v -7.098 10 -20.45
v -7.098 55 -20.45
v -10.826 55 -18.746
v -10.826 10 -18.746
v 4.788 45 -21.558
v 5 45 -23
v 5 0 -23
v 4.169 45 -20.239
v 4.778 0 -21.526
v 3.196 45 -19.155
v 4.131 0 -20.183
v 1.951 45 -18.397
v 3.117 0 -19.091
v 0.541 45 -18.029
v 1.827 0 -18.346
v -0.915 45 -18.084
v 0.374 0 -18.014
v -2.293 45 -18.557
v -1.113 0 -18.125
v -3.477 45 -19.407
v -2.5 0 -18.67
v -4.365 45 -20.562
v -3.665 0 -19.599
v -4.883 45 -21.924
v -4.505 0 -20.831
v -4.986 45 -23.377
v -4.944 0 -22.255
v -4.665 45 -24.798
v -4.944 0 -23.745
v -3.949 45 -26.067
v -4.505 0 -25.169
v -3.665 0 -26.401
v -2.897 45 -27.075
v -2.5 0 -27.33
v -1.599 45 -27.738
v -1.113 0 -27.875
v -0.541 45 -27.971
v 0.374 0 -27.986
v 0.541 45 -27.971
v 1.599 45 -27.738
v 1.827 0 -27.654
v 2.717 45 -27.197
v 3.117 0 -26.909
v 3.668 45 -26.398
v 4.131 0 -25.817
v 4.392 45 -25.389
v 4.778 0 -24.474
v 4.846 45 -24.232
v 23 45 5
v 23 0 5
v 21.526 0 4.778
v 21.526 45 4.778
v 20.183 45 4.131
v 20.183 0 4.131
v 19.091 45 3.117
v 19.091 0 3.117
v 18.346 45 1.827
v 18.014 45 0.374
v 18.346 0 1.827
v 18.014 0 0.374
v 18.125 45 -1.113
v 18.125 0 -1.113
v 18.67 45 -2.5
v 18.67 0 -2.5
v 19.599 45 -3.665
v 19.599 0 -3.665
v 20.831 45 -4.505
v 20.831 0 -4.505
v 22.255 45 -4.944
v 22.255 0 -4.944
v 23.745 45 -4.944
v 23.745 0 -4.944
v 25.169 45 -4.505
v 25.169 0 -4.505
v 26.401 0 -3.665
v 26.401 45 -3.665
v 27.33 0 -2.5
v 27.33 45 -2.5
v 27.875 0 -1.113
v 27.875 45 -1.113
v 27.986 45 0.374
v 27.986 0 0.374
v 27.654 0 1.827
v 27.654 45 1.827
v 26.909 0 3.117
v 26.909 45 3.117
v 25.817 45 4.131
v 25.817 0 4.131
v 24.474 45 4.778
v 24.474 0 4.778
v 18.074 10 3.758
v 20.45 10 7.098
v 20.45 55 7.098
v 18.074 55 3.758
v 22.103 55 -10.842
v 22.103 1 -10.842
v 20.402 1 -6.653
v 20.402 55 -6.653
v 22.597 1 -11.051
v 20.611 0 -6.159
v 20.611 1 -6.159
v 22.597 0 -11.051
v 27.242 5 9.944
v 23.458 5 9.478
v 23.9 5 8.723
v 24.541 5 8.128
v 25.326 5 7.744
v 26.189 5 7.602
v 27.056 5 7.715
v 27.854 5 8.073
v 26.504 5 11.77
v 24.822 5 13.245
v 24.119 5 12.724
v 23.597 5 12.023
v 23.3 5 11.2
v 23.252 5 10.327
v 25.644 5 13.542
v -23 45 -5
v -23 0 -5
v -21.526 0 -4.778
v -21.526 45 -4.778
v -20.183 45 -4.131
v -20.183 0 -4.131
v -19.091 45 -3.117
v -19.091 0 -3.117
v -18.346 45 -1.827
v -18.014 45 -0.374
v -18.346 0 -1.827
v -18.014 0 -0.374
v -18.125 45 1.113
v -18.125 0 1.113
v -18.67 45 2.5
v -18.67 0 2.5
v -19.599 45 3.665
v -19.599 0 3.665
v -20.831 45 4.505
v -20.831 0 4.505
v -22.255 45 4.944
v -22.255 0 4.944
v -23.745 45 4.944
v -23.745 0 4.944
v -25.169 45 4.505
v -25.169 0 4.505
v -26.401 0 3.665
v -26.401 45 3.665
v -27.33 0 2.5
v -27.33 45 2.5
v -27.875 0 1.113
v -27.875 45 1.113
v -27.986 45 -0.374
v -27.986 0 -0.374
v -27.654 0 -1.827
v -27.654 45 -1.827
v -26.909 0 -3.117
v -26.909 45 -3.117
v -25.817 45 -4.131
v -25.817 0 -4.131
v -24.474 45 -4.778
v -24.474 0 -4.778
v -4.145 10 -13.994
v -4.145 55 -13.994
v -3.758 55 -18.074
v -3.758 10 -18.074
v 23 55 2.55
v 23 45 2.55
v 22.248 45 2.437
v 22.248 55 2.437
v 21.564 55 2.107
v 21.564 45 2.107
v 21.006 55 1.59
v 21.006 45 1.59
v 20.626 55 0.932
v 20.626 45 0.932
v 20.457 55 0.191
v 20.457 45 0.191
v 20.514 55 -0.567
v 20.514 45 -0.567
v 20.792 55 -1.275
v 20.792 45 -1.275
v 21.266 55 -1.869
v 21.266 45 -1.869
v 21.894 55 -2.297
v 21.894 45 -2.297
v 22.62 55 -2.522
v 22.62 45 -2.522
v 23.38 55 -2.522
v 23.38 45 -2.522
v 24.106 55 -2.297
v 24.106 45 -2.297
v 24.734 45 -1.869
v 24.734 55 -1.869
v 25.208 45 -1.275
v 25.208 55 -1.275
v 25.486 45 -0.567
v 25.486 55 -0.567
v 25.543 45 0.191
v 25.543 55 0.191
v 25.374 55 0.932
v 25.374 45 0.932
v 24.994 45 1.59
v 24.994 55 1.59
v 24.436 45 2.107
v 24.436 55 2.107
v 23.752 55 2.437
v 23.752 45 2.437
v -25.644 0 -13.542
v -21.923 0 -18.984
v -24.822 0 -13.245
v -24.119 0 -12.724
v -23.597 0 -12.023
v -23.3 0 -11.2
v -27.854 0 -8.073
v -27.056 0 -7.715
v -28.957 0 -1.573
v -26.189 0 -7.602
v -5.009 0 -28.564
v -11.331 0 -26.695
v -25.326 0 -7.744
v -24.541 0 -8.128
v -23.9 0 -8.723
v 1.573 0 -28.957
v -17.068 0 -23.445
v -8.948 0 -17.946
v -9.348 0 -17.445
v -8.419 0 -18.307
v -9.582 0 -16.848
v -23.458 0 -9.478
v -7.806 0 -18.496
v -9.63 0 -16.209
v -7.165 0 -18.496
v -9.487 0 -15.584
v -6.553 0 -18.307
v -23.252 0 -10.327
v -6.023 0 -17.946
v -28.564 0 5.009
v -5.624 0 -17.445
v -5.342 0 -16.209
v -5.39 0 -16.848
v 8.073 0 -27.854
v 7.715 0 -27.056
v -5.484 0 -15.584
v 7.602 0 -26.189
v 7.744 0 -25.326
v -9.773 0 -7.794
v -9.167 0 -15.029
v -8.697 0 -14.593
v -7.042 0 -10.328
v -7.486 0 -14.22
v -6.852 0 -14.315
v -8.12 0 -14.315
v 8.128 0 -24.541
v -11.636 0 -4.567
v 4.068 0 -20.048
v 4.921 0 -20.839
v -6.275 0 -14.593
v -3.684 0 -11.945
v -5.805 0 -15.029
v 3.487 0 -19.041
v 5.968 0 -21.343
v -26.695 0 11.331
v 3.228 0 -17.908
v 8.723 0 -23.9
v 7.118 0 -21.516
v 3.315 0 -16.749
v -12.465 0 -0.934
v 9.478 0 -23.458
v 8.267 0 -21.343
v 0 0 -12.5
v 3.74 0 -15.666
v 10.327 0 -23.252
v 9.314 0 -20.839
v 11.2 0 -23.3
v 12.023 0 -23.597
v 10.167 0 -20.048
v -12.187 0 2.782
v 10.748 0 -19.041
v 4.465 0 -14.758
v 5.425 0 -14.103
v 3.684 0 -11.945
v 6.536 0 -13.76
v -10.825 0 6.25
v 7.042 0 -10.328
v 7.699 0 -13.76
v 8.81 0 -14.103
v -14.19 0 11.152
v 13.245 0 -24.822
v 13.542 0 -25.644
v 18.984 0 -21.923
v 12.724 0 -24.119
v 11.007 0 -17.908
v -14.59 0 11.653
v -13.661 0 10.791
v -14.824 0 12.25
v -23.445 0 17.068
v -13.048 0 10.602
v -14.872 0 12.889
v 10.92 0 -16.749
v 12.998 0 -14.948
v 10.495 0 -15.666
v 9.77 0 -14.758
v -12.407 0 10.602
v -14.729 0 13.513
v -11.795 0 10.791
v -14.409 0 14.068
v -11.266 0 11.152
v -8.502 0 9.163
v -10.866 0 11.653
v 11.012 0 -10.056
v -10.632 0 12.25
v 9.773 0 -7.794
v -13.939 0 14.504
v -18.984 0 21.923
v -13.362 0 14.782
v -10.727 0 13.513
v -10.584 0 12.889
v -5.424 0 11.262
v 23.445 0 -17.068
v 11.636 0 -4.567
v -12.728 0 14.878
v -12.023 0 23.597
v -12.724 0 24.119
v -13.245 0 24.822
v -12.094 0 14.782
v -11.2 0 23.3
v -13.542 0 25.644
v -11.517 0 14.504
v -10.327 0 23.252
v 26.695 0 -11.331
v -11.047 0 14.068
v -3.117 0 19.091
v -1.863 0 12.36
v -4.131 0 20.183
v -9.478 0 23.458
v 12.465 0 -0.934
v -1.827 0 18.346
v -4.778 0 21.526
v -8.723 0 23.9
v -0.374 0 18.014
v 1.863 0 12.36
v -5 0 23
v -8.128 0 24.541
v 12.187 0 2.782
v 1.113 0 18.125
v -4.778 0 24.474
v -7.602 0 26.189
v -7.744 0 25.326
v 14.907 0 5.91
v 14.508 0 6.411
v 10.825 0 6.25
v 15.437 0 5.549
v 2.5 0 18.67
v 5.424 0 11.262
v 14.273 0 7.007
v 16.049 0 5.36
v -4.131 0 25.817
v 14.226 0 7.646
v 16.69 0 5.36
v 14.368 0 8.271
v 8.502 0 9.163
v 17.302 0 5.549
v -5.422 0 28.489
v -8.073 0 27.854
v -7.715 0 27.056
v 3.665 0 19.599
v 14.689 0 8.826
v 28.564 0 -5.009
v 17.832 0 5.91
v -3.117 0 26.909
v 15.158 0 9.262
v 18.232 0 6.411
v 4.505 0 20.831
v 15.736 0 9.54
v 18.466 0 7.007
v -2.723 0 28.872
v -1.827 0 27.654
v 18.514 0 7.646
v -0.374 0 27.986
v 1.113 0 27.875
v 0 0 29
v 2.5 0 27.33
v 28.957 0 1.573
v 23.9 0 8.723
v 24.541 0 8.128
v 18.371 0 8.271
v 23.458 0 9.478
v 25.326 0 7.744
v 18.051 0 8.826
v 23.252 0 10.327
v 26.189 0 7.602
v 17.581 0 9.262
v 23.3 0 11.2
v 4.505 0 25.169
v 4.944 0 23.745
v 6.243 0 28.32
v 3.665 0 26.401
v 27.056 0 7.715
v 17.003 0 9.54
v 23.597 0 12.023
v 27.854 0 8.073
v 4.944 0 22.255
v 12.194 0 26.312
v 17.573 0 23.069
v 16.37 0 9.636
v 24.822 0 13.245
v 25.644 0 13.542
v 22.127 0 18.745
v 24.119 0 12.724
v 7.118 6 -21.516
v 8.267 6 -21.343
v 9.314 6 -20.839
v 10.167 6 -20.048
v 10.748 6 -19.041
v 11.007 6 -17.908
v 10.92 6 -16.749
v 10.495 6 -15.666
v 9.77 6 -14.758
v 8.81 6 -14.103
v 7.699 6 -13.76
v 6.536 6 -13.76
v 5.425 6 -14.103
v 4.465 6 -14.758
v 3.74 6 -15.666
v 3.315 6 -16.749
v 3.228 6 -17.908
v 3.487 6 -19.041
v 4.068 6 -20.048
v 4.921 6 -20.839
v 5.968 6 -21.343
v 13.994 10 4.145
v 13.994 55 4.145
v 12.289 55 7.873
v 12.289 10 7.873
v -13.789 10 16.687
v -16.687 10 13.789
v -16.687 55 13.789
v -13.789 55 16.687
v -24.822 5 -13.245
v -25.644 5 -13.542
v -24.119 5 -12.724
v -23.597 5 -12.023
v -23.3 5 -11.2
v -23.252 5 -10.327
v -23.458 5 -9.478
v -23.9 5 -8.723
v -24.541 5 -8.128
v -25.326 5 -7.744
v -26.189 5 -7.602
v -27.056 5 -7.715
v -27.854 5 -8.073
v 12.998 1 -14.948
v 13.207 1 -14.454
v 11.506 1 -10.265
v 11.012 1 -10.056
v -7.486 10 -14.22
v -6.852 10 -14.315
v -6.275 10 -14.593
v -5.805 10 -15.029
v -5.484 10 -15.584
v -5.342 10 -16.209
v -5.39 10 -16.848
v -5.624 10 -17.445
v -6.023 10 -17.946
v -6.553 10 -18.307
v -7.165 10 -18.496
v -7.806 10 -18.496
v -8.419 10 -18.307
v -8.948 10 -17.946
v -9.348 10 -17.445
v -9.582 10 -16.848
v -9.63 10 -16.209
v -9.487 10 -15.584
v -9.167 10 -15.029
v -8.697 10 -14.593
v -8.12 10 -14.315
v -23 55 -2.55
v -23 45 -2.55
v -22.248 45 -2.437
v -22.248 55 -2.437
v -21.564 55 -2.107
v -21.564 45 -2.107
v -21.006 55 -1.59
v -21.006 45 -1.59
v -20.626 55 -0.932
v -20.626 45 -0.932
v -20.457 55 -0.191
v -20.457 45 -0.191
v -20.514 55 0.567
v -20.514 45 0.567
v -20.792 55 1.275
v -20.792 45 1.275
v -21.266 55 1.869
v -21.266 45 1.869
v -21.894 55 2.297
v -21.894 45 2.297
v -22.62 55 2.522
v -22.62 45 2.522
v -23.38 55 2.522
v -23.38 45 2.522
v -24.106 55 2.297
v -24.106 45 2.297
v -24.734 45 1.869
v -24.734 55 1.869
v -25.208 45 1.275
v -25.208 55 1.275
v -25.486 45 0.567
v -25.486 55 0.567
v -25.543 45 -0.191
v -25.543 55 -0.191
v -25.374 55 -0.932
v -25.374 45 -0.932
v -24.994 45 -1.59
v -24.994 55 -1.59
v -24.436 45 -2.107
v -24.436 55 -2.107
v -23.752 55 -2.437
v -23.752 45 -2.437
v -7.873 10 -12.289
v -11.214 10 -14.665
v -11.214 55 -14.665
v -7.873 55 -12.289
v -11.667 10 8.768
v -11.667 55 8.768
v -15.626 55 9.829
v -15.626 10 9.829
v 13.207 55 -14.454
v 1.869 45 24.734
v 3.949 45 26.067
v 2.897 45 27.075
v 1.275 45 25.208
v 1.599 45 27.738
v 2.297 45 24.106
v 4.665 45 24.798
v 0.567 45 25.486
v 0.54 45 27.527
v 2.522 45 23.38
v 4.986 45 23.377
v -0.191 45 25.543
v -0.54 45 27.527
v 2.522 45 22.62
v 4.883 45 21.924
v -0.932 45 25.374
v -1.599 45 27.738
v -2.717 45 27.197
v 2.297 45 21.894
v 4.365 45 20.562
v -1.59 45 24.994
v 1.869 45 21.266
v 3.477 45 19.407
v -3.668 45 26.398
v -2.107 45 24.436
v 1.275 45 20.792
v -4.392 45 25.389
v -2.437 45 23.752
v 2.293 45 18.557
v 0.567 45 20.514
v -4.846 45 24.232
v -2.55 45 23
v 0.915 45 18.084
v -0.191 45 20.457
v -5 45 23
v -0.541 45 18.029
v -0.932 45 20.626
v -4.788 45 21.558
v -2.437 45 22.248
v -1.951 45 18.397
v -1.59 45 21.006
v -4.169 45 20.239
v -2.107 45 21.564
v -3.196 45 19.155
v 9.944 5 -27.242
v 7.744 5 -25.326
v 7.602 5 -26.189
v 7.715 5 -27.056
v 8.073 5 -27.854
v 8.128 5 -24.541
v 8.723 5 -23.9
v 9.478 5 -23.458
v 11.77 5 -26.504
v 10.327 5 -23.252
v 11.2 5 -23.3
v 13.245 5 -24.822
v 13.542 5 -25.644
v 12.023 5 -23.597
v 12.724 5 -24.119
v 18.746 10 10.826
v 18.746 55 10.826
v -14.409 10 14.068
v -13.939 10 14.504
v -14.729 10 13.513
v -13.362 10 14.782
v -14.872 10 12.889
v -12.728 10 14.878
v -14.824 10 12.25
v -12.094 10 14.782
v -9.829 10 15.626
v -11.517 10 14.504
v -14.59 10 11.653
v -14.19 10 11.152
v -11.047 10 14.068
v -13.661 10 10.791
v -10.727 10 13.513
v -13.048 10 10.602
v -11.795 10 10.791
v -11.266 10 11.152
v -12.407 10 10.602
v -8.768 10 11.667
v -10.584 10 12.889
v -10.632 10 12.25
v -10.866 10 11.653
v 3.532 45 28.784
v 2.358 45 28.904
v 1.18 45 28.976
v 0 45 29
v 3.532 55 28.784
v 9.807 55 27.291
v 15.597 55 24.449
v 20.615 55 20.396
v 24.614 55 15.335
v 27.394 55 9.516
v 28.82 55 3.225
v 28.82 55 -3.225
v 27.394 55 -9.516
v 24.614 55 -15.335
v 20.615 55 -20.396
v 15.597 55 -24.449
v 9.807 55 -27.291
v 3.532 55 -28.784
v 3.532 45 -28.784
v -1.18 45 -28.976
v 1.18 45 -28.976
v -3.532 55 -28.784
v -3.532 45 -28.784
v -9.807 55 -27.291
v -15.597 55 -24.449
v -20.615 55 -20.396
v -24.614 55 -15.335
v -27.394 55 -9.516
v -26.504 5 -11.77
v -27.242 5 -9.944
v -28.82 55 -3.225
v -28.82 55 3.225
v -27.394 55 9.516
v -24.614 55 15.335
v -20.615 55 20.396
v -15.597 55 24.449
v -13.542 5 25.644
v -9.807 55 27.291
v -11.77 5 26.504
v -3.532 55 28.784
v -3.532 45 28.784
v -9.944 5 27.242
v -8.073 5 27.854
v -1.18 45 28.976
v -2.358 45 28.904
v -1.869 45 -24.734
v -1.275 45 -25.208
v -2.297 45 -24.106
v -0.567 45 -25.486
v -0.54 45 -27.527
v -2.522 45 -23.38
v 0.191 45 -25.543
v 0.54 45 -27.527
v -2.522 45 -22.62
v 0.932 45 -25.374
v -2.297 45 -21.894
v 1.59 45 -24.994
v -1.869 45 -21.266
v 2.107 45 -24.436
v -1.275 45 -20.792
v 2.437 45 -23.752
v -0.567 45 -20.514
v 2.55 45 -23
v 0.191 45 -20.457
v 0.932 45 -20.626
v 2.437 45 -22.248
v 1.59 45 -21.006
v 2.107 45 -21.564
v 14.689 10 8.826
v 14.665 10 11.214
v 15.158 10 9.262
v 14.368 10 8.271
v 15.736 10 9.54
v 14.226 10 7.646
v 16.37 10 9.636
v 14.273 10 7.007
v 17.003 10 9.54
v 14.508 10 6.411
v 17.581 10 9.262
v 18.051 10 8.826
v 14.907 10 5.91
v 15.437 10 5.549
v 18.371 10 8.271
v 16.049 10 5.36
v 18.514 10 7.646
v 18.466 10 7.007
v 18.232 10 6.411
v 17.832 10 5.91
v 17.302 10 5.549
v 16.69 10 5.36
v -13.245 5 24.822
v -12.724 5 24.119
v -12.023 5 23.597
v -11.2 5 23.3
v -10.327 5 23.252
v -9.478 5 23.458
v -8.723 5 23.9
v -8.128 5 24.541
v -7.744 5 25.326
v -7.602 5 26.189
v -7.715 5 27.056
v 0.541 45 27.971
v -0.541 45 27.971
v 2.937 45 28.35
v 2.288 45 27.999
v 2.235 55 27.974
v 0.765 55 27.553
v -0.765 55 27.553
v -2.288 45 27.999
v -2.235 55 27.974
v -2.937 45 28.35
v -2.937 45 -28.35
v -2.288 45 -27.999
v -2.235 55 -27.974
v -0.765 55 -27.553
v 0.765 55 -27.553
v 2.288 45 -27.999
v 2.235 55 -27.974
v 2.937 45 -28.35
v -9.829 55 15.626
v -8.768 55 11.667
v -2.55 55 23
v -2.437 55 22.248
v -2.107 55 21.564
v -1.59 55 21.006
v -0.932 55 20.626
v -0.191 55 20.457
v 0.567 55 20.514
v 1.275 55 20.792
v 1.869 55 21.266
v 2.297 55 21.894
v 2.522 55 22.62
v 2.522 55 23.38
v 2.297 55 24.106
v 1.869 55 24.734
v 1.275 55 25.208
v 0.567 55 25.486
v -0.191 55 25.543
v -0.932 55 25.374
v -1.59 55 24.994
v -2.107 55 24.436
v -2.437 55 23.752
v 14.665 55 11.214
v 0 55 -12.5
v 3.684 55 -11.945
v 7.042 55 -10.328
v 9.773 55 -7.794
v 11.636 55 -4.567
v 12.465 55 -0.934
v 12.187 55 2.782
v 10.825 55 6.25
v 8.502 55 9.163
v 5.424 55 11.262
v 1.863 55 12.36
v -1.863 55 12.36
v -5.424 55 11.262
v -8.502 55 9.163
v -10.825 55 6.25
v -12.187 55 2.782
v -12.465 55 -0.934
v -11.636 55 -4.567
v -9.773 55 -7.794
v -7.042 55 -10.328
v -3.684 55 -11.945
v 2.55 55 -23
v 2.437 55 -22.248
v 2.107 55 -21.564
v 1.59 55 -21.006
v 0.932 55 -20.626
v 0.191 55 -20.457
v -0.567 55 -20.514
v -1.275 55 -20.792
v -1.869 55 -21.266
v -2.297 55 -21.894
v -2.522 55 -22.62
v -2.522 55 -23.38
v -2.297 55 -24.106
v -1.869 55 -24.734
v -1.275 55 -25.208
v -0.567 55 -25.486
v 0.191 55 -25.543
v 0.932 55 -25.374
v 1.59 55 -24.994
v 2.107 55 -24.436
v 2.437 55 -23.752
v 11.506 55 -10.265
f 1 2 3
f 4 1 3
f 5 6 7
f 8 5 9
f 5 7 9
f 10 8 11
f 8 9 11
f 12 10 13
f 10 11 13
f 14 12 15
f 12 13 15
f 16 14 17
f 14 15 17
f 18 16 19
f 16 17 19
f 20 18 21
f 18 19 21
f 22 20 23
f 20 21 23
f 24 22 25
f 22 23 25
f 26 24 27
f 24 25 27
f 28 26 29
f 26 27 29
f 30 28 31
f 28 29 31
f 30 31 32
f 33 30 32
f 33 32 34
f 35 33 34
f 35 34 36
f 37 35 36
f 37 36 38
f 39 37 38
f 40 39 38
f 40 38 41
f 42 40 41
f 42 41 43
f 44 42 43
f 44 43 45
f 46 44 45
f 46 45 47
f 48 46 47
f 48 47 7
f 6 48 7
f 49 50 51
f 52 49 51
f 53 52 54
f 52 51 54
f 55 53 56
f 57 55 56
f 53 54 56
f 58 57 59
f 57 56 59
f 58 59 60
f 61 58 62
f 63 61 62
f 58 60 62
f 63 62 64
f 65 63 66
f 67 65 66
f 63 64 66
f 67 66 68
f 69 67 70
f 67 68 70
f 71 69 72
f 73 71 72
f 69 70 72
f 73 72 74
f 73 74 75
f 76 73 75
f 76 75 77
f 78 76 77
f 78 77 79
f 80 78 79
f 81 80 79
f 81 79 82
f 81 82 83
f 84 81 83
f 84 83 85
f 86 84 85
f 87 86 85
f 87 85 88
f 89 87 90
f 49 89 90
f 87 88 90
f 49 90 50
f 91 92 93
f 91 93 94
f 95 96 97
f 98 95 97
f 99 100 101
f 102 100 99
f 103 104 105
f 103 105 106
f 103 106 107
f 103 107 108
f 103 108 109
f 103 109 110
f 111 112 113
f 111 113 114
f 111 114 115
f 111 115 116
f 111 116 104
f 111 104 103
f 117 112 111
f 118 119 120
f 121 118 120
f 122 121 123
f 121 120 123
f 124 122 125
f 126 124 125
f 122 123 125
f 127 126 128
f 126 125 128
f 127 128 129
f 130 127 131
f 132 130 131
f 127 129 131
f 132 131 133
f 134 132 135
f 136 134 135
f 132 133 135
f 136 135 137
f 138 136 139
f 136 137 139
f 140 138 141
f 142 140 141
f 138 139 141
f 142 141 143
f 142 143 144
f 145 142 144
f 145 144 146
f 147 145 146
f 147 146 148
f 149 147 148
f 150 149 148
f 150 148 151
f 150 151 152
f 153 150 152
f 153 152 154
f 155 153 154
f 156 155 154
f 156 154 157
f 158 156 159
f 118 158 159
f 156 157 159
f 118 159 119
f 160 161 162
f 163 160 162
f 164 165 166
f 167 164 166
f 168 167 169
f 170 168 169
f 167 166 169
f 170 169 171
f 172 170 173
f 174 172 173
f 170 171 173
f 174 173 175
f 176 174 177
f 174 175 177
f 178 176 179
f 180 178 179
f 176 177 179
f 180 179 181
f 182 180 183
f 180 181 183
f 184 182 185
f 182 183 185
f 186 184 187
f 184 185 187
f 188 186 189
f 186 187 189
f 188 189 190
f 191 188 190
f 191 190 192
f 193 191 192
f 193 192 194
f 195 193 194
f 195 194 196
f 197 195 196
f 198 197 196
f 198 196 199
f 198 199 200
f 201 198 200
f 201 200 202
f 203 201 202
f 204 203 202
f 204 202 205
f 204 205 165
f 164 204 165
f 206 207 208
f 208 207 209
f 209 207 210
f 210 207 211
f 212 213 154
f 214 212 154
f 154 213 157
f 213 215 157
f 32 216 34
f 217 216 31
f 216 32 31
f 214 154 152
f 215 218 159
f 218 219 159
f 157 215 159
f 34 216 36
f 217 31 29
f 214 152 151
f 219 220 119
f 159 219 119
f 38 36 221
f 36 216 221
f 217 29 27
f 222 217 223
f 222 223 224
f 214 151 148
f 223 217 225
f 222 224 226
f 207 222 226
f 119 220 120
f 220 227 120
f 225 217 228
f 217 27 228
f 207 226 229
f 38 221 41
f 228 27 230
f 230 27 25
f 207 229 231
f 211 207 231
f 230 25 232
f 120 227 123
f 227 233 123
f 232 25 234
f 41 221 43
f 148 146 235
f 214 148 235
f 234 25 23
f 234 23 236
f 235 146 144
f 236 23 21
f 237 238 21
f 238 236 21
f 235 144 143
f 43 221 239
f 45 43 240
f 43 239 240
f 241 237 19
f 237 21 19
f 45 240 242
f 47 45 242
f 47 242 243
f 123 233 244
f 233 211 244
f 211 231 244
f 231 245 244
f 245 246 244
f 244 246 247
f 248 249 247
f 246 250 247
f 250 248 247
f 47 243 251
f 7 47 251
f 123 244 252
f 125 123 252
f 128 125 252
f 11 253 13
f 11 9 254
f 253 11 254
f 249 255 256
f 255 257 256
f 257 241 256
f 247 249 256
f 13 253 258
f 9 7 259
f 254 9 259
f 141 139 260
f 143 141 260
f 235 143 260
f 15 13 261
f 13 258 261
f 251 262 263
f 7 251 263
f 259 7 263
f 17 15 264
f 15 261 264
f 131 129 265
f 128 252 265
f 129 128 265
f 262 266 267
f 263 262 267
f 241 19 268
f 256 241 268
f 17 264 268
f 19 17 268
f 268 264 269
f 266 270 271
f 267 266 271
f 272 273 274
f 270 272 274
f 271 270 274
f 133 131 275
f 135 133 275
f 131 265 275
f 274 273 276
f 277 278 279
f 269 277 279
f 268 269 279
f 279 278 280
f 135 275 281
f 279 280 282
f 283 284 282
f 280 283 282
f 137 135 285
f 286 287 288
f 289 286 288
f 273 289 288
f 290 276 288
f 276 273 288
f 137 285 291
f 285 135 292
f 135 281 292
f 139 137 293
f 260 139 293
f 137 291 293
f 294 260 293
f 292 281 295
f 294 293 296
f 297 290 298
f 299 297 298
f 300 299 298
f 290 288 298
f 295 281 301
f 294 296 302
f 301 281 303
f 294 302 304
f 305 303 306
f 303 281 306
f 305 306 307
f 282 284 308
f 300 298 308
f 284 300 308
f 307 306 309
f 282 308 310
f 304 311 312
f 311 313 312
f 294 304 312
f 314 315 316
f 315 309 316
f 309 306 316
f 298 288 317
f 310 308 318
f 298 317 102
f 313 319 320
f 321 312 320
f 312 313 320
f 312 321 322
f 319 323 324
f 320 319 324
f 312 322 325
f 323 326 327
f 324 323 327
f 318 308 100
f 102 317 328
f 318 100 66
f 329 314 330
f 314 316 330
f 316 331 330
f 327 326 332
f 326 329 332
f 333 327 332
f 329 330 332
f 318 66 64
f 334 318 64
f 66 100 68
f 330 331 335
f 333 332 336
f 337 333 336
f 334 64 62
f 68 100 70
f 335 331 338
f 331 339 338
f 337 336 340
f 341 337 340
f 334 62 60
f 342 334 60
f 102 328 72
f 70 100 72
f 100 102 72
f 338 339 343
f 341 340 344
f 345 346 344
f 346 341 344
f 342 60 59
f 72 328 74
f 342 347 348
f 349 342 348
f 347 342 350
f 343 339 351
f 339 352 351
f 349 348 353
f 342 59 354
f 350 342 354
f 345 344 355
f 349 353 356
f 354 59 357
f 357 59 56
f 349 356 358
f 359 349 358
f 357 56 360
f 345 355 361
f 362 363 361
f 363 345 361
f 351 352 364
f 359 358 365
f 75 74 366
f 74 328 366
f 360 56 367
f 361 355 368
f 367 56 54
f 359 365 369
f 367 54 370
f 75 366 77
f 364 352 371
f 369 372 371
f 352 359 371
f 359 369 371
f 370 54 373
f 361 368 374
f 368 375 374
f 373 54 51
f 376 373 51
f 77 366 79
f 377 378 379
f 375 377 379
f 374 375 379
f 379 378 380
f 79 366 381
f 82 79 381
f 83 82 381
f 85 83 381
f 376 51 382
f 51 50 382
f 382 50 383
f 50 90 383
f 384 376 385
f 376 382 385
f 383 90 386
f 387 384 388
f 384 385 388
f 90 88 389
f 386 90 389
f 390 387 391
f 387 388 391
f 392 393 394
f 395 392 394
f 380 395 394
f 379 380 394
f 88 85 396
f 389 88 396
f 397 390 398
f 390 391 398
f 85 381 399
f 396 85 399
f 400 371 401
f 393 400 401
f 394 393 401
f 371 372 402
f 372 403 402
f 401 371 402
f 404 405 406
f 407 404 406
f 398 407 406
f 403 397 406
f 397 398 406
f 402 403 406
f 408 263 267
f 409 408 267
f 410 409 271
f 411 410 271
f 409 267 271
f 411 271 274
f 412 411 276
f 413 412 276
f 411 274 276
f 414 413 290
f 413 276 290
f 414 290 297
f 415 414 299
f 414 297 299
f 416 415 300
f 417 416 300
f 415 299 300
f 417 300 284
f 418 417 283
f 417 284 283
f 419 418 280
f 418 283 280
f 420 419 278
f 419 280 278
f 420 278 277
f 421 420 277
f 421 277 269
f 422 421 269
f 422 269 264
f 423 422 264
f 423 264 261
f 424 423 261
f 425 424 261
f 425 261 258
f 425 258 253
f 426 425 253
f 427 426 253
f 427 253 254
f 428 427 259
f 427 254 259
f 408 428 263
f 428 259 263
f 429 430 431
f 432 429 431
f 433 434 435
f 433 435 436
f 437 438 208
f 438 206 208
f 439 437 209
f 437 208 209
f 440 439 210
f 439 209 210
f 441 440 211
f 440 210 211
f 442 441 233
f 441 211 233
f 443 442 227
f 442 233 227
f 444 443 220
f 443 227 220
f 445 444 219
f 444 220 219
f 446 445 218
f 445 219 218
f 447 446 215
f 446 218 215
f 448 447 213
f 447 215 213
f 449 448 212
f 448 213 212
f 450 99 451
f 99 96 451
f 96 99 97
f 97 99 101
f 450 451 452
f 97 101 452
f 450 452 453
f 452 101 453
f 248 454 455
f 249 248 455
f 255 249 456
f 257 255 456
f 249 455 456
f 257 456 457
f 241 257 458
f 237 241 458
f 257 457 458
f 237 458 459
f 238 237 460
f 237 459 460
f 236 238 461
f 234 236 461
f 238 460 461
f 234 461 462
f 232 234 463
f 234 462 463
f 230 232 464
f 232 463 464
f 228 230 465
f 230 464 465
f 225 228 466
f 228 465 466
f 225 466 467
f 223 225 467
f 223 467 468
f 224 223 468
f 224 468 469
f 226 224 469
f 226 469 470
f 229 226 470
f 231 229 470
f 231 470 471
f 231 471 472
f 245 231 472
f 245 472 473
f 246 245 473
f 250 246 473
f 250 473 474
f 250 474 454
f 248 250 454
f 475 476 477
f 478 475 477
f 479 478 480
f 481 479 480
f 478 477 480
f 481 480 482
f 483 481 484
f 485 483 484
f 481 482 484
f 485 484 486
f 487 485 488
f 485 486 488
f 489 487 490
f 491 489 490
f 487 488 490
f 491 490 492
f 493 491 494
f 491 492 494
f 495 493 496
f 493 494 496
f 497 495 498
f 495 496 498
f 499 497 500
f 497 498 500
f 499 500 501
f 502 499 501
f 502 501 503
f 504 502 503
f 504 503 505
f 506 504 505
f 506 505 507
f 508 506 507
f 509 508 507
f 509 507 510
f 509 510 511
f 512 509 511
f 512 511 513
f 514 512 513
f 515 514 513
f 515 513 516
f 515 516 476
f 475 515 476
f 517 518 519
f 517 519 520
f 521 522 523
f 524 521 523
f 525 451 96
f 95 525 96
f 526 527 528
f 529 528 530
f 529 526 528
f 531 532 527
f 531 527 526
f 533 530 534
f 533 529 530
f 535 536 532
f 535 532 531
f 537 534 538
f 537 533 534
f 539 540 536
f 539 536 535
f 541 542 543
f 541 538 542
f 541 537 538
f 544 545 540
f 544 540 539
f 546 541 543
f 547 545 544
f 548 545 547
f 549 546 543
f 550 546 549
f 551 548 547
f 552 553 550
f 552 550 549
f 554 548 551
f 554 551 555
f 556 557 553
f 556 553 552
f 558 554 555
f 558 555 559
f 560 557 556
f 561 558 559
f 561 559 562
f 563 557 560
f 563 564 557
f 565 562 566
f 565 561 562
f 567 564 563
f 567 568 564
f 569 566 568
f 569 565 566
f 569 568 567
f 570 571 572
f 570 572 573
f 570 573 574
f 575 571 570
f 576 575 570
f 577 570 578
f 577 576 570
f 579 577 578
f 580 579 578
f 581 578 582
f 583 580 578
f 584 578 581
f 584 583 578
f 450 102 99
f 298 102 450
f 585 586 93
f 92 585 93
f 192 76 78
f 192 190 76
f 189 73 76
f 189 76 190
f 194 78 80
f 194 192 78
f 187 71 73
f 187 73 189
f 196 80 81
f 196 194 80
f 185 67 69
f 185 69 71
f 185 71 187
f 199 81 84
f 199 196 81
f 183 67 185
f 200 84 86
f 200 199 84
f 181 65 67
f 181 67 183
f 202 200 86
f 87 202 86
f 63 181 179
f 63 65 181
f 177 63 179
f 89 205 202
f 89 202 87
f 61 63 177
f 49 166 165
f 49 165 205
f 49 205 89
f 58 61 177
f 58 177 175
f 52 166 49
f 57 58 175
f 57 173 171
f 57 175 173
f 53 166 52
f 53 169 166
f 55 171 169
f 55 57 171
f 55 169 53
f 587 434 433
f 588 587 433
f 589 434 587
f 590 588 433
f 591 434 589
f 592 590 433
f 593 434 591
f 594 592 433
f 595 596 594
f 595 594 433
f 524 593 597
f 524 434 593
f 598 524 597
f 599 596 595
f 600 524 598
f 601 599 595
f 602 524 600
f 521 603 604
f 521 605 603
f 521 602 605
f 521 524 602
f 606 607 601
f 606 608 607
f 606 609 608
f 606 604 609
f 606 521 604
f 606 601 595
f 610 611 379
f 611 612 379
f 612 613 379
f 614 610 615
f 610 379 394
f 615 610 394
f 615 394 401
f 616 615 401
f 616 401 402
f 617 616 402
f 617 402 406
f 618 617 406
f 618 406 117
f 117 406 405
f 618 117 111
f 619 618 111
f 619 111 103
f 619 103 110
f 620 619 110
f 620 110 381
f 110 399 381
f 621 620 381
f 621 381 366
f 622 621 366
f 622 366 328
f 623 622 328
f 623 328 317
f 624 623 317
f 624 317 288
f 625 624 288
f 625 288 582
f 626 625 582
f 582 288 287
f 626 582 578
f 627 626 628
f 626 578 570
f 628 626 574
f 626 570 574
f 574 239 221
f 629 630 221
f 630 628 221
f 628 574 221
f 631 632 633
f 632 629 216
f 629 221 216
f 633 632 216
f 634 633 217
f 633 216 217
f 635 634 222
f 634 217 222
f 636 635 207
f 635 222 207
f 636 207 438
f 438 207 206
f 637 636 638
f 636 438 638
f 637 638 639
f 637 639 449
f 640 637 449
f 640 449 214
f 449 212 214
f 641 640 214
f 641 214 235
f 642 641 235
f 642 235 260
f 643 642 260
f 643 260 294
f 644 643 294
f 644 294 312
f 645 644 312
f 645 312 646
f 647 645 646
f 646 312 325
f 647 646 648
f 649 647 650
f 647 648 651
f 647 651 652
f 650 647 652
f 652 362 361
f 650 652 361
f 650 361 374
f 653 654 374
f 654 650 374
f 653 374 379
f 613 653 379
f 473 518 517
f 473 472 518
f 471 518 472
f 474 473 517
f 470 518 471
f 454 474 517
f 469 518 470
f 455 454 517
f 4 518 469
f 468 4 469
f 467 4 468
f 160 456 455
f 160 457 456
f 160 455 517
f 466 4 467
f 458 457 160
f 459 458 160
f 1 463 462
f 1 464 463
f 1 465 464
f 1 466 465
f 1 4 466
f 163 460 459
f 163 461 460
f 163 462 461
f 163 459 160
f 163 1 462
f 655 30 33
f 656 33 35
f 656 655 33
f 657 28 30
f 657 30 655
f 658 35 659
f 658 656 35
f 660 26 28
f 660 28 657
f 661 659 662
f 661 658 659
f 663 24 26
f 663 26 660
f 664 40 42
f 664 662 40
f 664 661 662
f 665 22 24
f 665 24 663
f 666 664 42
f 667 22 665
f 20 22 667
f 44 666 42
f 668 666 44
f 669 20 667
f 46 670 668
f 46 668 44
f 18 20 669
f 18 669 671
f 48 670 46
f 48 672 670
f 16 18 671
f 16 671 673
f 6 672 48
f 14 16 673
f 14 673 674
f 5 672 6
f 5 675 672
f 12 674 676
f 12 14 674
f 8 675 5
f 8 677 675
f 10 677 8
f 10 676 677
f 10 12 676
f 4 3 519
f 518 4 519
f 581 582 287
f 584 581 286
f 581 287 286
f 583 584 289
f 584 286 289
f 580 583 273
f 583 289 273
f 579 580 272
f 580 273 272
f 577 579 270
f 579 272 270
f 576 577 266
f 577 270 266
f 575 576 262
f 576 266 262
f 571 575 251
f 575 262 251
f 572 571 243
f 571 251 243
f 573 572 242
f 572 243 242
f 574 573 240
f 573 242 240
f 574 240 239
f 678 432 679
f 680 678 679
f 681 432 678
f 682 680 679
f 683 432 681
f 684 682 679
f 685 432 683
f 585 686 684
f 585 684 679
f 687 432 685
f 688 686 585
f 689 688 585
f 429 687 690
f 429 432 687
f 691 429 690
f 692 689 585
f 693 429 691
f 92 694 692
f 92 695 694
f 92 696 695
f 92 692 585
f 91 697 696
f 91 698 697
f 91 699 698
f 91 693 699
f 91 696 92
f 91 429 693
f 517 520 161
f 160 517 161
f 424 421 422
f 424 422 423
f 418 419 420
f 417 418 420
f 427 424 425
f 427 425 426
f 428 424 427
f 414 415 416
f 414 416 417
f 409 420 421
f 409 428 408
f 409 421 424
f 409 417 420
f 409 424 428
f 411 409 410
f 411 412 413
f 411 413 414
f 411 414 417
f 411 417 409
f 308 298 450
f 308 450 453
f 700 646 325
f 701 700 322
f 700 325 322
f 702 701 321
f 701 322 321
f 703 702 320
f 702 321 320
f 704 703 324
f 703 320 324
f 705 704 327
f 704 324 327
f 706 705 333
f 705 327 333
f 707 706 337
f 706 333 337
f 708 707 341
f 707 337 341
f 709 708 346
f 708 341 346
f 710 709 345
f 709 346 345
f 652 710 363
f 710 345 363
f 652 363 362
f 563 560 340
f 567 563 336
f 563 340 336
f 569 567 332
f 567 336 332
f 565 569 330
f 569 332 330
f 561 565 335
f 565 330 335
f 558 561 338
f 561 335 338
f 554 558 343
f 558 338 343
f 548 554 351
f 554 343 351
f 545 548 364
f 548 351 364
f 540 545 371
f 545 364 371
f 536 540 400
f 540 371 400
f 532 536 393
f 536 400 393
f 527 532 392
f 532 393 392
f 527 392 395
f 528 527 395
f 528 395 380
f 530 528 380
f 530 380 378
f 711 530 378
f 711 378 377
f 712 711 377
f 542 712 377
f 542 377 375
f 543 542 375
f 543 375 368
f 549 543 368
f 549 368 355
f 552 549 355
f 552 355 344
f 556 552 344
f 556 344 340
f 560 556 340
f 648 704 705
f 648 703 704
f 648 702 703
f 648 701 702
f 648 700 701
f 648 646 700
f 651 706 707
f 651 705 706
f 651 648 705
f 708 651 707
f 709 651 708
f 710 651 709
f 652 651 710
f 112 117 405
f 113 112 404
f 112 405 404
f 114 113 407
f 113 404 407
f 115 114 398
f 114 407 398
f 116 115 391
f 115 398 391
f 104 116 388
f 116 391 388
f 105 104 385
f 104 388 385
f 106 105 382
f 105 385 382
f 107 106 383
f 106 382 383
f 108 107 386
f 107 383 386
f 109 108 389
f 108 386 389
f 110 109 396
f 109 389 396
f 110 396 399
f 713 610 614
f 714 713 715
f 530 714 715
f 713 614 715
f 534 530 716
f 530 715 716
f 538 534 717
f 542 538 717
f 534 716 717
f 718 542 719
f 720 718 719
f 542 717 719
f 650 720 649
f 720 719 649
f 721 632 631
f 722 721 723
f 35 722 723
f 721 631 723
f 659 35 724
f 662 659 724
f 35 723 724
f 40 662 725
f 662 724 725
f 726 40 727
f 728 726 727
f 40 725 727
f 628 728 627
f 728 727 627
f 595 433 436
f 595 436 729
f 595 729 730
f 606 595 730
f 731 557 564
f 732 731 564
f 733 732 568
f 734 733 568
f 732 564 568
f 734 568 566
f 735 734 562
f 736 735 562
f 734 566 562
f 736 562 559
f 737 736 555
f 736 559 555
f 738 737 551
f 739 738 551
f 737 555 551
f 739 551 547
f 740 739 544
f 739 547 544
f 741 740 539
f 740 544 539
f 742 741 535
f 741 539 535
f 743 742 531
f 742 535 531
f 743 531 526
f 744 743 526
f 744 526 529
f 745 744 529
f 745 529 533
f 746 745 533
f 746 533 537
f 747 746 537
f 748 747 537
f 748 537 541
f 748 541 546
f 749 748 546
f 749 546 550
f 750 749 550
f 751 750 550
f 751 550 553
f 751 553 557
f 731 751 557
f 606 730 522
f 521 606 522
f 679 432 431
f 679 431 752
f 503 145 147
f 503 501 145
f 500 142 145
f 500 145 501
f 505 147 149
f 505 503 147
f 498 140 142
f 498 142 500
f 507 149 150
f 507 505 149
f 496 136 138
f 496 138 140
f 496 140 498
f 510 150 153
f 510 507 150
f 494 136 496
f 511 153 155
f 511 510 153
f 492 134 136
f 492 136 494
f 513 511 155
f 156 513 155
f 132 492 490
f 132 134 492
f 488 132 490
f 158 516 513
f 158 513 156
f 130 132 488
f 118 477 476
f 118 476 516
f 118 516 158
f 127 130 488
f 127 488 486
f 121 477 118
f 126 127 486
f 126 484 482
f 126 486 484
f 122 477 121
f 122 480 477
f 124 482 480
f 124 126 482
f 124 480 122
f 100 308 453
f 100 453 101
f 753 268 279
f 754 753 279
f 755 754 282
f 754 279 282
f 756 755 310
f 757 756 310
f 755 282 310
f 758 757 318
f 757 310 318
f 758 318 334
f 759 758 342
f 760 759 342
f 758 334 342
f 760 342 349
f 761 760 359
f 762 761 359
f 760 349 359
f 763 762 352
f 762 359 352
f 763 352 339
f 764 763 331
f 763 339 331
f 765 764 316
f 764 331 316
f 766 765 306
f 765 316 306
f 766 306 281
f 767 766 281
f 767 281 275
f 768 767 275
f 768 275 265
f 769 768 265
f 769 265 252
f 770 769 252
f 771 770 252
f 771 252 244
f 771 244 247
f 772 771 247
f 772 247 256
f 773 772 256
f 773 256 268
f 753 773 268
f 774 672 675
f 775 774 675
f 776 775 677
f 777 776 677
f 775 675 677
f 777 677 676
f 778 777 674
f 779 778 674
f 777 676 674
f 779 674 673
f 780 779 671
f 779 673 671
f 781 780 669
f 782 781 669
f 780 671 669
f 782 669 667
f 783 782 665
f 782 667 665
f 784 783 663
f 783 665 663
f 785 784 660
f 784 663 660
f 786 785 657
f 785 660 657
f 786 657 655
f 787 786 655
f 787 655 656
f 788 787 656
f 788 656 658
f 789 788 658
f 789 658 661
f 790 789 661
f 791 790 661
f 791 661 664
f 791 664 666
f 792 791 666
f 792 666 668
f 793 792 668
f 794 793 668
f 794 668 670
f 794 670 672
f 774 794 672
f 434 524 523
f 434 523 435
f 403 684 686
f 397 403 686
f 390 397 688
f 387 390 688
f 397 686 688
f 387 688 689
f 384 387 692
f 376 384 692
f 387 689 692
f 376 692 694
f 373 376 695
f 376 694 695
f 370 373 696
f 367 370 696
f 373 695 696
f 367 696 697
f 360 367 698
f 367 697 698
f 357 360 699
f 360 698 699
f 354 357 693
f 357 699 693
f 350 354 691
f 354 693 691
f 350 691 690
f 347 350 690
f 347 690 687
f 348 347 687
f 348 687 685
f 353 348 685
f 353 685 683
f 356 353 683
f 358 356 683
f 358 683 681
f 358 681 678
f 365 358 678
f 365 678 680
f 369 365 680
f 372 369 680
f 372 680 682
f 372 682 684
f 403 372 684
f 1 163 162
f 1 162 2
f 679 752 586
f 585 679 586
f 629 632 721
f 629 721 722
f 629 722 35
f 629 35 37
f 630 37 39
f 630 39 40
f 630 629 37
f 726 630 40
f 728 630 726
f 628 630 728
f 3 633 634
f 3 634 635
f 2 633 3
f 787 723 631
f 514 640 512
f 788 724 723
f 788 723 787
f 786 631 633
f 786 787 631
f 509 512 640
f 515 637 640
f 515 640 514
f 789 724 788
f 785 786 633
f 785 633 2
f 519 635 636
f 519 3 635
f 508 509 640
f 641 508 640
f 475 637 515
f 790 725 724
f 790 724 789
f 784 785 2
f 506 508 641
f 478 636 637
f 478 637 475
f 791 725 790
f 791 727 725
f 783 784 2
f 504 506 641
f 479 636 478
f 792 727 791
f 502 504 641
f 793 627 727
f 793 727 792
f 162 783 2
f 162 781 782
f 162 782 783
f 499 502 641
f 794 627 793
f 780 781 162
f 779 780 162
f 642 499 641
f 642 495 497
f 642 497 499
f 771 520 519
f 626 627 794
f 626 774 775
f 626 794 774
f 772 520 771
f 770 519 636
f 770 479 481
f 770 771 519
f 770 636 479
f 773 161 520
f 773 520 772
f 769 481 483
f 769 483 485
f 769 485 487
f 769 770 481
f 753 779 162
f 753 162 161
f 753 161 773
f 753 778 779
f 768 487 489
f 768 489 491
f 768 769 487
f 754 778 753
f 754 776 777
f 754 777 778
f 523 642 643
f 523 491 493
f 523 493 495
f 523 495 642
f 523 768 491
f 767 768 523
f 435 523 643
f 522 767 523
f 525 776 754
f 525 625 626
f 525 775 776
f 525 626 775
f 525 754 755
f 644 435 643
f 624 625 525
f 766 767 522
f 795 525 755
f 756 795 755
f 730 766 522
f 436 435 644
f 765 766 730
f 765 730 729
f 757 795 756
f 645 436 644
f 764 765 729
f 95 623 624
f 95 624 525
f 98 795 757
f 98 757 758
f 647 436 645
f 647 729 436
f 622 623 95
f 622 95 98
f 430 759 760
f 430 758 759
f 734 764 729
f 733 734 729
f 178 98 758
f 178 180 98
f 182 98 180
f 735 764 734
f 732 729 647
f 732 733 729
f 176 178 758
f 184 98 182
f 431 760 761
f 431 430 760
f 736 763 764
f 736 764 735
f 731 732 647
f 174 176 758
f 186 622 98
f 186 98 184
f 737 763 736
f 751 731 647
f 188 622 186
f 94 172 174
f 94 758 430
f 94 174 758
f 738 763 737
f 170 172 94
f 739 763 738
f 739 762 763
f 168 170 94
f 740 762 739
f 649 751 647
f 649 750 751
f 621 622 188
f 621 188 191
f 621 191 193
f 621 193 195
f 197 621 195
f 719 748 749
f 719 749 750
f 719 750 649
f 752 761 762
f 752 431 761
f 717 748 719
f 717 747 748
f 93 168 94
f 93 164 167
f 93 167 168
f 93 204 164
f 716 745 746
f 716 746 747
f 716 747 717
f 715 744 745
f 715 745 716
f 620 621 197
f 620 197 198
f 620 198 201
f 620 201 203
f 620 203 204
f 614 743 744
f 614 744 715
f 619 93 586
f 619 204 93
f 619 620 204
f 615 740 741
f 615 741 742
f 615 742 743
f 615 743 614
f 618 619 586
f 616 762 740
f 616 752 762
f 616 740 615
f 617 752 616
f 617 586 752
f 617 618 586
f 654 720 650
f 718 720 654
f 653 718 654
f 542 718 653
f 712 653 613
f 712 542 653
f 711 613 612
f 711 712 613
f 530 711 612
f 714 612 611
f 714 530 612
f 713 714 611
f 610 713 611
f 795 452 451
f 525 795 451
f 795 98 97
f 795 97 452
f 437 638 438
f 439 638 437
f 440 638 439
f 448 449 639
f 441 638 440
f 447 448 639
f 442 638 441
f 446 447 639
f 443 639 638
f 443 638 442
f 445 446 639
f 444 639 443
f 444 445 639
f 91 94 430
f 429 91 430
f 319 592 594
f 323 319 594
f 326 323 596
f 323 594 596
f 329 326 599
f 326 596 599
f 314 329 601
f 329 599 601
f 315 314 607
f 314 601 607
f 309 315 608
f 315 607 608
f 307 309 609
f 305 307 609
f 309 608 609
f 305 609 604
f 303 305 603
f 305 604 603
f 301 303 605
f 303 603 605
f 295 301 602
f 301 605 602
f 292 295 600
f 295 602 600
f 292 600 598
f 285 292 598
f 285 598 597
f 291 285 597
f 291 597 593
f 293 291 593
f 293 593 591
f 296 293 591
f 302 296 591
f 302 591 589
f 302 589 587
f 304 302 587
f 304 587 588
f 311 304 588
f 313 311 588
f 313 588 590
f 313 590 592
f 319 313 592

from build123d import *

# Parameters (mm, degrees)
SKETCH1_R           = 29
BOSS_EXTRUDE1_DEPTH = 55
SKETCH5_R           = 5
CUT_EXTRUDE2_DEPTH  = 45
SKETCH4_R           = 2.55
CUT_EXTRUDE1_DEPTH  = 69.607579756
CIRPATTERN2_COUNT   = 4
SKETCH6_R           = 12.5
CUT_EXTRUDE3_DEPTH  = 69.607579756
SKETCH8_R           = 3
CUT_EXTRUDE4_DEPTH  = 5
CUT_EXTRUDE5_DEPTH  = 1
CUT_EXTRUDE6_DEPTH  = 68.808554033
SKETCH12_R          = 3.9
CUT_EXTRUDE7_DEPTH  = 6
CUT_EXTRUDE8_DEPTH  = 45
SKETCH14_R          = 2.15
CUT_EXTRUDE9_DEPTH  = 69.607579756
SKETCH16_R          = 5.5
CUT_EXTRUDE10_DEPTH = 10


with BuildPart() as part:
    # Sketch1 → Boss-Extrude1 (new body)
    with BuildSketch(Plane(origin=(0, 0, 0), x_dir=(1, 0, 0), z_dir=(0, 1, 0))):
        with Locations(Location((0, 0, 0), (0, 0, 270))):
            Circle(SKETCH1_R)
    extrude(amount=BOSS_EXTRUDE1_DEPTH)

    # Sketch5 → Cut-Extrude2 (cut)
    with BuildSketch(Plane.XZ):
        with Locations(Location((-23, 0, 0), (0, 0, 270))):
            Circle(SKETCH5_R)
    cut_extrude2 = extrude(amount=-CUT_EXTRUDE2_DEPTH, mode=Mode.SUBTRACT)

    # Sketch4 → Cut-Extrude1 (cut, through all)
    with BuildSketch(Plane.XZ):
        with Locations(Location((-23, 0, 0), (0, 0, 270))):
            Circle(SKETCH4_R)
    cut_extrude1 = extrude(amount=-CUT_EXTRUDE1_DEPTH, mode=Mode.SUBTRACT)

    # CirPattern2: Cut-Extrude2, Cut-Extrude1 ×4 about axis
    cirpattern2_axis = Axis((0, 0, 0), (0, 1, 0))
    add([cut_extrude2.rotate(cirpattern2_axis, i * 360 / CIRPATTERN2_COUNT) for i in range(1, CIRPATTERN2_COUNT)], mode=Mode.SUBTRACT)
    add([cut_extrude1.rotate(cirpattern2_axis, i * 360 / CIRPATTERN2_COUNT) for i in range(1, CIRPATTERN2_COUNT)], mode=Mode.SUBTRACT)

    # Sketch6 → Cut-Extrude3 (cut, through all)
    with BuildSketch(Plane.XZ):
        with Locations(Location((0, 0, 0), (0, 0, 270))):
            Circle(SKETCH6_R)
    extrude(amount=-CUT_EXTRUDE3_DEPTH, mode=Mode.SUBTRACT)

    # Sketch8 → Cut-Extrude4 (cut)
    with BuildSketch(Plane.XZ):
        with Locations((-10.601366594, 26.239303084)):
            Circle(SKETCH8_R)
        with Locations((-26.239303084, -10.601366594)):
            Circle(SKETCH8_R)
        with Locations((10.601366594, -26.239303084)):
            Circle(SKETCH8_R)
        with Locations((26.239303084, 10.601366594)):
            Circle(SKETCH8_R)
    extrude(amount=-CUT_EXTRUDE4_DEPTH, mode=Mode.SUBTRACT)

    # Sketch9 → Cut-Extrude5 (cut)
    with BuildSketch(Plane.XZ):
        Polygon((20.610897481, -6.158537344), (22.597250544, -11.050653604), (12.998325456, -14.948119084), (11.011972394, -10.056002823), align=None)
    extrude(amount=-CUT_EXTRUDE5_DEPTH, mode=Mode.SUBTRACT)

    # Sketch11 → Cut-Extrude6 (cut, through all)
    with BuildSketch(Plane.XZ.offset(-1)):
        Polygon((22.102990836, -10.841856908), (20.402100785, -6.652797052), (11.506232102, -10.264799519), (13.207122153, -14.453859375), align=None)
    extrude(amount=-CUT_EXTRUDE6_DEPTH, mode=Mode.SUBTRACT)

    # Sketch12 → Cut-Extrude7 (cut)
    with BuildSketch(Plane.XZ):
        with Locations(Location((7.117525275, -17.616493237, 0), (0, 0, 270))):
            Circle(SKETCH12_R)
    extrude(amount=-CUT_EXTRUDE7_DEPTH, mode=Mode.SUBTRACT)

    # Sketch13 → Cut-Extrude8 (cut)
    with BuildSketch(Plane(origin=(0, 55, 0), x_dir=(1, 0, 0), z_dir=(0, 1, 0))):
        Polygon((18.745625864, -10.826118617), (20.450388629, -7.098234868), (18.074327983, -3.757925131), (13.993504571, -4.145499143), (12.288741806, -7.873382892), (14.664802452, -11.213692629), align=None)
        Polygon((-4.145499143, 13.993504571), (-3.757925131, 18.074327983), (-7.098234868, 20.450388629), (-10.826118617, 18.745625864), (-11.213692629, 14.664802452), (-7.873382892, 12.288741806), align=None)
        Polygon((-13.788869703, -16.687432566), (-9.829359199, -15.626484924), (-8.768411557, -11.666974419), (-11.666974419, -8.768411557), (-15.626484924, -9.829359199), (-16.687432566, -13.788869703), align=None)
    extrude(amount=-CUT_EXTRUDE8_DEPTH, mode=Mode.SUBTRACT)

    # Sketch14 → Cut-Extrude9 (cut, through all)
    with BuildSketch(Plane(origin=(0, 55, 0), x_dir=(1, 0, 0), z_dir=(0, 1, 0))):
        with Locations(Location((-7.48580888, 16.369565217, 0), (0, 0, 270))):
            Circle(SKETCH14_R)
        with Locations(Location((16.369565217, -7.48580888, 0), (0, 0, 270))):
            Circle(SKETCH14_R)
        with Locations(Location((-12.727922061, -12.727922061, 0), (0, 0, 270))):
            Circle(SKETCH14_R)
    extrude(amount=-CUT_EXTRUDE9_DEPTH, mode=Mode.SUBTRACT)

    # Sketch16 → Cut-Extrude10 (cut)
    with BuildSketch(Plane(origin=(0, 55, 0), x_dir=(1, 0, 0), z_dir=(0, 1, 0))):
        with Locations((0, 33)):
            Circle(SKETCH16_R)
        with Locations((0, -33)):
            Circle(SKETCH16_R)
    extrude(amount=-CUT_EXTRUDE10_DEPTH, mode=Mode.SUBTRACT)


solid = part.part
